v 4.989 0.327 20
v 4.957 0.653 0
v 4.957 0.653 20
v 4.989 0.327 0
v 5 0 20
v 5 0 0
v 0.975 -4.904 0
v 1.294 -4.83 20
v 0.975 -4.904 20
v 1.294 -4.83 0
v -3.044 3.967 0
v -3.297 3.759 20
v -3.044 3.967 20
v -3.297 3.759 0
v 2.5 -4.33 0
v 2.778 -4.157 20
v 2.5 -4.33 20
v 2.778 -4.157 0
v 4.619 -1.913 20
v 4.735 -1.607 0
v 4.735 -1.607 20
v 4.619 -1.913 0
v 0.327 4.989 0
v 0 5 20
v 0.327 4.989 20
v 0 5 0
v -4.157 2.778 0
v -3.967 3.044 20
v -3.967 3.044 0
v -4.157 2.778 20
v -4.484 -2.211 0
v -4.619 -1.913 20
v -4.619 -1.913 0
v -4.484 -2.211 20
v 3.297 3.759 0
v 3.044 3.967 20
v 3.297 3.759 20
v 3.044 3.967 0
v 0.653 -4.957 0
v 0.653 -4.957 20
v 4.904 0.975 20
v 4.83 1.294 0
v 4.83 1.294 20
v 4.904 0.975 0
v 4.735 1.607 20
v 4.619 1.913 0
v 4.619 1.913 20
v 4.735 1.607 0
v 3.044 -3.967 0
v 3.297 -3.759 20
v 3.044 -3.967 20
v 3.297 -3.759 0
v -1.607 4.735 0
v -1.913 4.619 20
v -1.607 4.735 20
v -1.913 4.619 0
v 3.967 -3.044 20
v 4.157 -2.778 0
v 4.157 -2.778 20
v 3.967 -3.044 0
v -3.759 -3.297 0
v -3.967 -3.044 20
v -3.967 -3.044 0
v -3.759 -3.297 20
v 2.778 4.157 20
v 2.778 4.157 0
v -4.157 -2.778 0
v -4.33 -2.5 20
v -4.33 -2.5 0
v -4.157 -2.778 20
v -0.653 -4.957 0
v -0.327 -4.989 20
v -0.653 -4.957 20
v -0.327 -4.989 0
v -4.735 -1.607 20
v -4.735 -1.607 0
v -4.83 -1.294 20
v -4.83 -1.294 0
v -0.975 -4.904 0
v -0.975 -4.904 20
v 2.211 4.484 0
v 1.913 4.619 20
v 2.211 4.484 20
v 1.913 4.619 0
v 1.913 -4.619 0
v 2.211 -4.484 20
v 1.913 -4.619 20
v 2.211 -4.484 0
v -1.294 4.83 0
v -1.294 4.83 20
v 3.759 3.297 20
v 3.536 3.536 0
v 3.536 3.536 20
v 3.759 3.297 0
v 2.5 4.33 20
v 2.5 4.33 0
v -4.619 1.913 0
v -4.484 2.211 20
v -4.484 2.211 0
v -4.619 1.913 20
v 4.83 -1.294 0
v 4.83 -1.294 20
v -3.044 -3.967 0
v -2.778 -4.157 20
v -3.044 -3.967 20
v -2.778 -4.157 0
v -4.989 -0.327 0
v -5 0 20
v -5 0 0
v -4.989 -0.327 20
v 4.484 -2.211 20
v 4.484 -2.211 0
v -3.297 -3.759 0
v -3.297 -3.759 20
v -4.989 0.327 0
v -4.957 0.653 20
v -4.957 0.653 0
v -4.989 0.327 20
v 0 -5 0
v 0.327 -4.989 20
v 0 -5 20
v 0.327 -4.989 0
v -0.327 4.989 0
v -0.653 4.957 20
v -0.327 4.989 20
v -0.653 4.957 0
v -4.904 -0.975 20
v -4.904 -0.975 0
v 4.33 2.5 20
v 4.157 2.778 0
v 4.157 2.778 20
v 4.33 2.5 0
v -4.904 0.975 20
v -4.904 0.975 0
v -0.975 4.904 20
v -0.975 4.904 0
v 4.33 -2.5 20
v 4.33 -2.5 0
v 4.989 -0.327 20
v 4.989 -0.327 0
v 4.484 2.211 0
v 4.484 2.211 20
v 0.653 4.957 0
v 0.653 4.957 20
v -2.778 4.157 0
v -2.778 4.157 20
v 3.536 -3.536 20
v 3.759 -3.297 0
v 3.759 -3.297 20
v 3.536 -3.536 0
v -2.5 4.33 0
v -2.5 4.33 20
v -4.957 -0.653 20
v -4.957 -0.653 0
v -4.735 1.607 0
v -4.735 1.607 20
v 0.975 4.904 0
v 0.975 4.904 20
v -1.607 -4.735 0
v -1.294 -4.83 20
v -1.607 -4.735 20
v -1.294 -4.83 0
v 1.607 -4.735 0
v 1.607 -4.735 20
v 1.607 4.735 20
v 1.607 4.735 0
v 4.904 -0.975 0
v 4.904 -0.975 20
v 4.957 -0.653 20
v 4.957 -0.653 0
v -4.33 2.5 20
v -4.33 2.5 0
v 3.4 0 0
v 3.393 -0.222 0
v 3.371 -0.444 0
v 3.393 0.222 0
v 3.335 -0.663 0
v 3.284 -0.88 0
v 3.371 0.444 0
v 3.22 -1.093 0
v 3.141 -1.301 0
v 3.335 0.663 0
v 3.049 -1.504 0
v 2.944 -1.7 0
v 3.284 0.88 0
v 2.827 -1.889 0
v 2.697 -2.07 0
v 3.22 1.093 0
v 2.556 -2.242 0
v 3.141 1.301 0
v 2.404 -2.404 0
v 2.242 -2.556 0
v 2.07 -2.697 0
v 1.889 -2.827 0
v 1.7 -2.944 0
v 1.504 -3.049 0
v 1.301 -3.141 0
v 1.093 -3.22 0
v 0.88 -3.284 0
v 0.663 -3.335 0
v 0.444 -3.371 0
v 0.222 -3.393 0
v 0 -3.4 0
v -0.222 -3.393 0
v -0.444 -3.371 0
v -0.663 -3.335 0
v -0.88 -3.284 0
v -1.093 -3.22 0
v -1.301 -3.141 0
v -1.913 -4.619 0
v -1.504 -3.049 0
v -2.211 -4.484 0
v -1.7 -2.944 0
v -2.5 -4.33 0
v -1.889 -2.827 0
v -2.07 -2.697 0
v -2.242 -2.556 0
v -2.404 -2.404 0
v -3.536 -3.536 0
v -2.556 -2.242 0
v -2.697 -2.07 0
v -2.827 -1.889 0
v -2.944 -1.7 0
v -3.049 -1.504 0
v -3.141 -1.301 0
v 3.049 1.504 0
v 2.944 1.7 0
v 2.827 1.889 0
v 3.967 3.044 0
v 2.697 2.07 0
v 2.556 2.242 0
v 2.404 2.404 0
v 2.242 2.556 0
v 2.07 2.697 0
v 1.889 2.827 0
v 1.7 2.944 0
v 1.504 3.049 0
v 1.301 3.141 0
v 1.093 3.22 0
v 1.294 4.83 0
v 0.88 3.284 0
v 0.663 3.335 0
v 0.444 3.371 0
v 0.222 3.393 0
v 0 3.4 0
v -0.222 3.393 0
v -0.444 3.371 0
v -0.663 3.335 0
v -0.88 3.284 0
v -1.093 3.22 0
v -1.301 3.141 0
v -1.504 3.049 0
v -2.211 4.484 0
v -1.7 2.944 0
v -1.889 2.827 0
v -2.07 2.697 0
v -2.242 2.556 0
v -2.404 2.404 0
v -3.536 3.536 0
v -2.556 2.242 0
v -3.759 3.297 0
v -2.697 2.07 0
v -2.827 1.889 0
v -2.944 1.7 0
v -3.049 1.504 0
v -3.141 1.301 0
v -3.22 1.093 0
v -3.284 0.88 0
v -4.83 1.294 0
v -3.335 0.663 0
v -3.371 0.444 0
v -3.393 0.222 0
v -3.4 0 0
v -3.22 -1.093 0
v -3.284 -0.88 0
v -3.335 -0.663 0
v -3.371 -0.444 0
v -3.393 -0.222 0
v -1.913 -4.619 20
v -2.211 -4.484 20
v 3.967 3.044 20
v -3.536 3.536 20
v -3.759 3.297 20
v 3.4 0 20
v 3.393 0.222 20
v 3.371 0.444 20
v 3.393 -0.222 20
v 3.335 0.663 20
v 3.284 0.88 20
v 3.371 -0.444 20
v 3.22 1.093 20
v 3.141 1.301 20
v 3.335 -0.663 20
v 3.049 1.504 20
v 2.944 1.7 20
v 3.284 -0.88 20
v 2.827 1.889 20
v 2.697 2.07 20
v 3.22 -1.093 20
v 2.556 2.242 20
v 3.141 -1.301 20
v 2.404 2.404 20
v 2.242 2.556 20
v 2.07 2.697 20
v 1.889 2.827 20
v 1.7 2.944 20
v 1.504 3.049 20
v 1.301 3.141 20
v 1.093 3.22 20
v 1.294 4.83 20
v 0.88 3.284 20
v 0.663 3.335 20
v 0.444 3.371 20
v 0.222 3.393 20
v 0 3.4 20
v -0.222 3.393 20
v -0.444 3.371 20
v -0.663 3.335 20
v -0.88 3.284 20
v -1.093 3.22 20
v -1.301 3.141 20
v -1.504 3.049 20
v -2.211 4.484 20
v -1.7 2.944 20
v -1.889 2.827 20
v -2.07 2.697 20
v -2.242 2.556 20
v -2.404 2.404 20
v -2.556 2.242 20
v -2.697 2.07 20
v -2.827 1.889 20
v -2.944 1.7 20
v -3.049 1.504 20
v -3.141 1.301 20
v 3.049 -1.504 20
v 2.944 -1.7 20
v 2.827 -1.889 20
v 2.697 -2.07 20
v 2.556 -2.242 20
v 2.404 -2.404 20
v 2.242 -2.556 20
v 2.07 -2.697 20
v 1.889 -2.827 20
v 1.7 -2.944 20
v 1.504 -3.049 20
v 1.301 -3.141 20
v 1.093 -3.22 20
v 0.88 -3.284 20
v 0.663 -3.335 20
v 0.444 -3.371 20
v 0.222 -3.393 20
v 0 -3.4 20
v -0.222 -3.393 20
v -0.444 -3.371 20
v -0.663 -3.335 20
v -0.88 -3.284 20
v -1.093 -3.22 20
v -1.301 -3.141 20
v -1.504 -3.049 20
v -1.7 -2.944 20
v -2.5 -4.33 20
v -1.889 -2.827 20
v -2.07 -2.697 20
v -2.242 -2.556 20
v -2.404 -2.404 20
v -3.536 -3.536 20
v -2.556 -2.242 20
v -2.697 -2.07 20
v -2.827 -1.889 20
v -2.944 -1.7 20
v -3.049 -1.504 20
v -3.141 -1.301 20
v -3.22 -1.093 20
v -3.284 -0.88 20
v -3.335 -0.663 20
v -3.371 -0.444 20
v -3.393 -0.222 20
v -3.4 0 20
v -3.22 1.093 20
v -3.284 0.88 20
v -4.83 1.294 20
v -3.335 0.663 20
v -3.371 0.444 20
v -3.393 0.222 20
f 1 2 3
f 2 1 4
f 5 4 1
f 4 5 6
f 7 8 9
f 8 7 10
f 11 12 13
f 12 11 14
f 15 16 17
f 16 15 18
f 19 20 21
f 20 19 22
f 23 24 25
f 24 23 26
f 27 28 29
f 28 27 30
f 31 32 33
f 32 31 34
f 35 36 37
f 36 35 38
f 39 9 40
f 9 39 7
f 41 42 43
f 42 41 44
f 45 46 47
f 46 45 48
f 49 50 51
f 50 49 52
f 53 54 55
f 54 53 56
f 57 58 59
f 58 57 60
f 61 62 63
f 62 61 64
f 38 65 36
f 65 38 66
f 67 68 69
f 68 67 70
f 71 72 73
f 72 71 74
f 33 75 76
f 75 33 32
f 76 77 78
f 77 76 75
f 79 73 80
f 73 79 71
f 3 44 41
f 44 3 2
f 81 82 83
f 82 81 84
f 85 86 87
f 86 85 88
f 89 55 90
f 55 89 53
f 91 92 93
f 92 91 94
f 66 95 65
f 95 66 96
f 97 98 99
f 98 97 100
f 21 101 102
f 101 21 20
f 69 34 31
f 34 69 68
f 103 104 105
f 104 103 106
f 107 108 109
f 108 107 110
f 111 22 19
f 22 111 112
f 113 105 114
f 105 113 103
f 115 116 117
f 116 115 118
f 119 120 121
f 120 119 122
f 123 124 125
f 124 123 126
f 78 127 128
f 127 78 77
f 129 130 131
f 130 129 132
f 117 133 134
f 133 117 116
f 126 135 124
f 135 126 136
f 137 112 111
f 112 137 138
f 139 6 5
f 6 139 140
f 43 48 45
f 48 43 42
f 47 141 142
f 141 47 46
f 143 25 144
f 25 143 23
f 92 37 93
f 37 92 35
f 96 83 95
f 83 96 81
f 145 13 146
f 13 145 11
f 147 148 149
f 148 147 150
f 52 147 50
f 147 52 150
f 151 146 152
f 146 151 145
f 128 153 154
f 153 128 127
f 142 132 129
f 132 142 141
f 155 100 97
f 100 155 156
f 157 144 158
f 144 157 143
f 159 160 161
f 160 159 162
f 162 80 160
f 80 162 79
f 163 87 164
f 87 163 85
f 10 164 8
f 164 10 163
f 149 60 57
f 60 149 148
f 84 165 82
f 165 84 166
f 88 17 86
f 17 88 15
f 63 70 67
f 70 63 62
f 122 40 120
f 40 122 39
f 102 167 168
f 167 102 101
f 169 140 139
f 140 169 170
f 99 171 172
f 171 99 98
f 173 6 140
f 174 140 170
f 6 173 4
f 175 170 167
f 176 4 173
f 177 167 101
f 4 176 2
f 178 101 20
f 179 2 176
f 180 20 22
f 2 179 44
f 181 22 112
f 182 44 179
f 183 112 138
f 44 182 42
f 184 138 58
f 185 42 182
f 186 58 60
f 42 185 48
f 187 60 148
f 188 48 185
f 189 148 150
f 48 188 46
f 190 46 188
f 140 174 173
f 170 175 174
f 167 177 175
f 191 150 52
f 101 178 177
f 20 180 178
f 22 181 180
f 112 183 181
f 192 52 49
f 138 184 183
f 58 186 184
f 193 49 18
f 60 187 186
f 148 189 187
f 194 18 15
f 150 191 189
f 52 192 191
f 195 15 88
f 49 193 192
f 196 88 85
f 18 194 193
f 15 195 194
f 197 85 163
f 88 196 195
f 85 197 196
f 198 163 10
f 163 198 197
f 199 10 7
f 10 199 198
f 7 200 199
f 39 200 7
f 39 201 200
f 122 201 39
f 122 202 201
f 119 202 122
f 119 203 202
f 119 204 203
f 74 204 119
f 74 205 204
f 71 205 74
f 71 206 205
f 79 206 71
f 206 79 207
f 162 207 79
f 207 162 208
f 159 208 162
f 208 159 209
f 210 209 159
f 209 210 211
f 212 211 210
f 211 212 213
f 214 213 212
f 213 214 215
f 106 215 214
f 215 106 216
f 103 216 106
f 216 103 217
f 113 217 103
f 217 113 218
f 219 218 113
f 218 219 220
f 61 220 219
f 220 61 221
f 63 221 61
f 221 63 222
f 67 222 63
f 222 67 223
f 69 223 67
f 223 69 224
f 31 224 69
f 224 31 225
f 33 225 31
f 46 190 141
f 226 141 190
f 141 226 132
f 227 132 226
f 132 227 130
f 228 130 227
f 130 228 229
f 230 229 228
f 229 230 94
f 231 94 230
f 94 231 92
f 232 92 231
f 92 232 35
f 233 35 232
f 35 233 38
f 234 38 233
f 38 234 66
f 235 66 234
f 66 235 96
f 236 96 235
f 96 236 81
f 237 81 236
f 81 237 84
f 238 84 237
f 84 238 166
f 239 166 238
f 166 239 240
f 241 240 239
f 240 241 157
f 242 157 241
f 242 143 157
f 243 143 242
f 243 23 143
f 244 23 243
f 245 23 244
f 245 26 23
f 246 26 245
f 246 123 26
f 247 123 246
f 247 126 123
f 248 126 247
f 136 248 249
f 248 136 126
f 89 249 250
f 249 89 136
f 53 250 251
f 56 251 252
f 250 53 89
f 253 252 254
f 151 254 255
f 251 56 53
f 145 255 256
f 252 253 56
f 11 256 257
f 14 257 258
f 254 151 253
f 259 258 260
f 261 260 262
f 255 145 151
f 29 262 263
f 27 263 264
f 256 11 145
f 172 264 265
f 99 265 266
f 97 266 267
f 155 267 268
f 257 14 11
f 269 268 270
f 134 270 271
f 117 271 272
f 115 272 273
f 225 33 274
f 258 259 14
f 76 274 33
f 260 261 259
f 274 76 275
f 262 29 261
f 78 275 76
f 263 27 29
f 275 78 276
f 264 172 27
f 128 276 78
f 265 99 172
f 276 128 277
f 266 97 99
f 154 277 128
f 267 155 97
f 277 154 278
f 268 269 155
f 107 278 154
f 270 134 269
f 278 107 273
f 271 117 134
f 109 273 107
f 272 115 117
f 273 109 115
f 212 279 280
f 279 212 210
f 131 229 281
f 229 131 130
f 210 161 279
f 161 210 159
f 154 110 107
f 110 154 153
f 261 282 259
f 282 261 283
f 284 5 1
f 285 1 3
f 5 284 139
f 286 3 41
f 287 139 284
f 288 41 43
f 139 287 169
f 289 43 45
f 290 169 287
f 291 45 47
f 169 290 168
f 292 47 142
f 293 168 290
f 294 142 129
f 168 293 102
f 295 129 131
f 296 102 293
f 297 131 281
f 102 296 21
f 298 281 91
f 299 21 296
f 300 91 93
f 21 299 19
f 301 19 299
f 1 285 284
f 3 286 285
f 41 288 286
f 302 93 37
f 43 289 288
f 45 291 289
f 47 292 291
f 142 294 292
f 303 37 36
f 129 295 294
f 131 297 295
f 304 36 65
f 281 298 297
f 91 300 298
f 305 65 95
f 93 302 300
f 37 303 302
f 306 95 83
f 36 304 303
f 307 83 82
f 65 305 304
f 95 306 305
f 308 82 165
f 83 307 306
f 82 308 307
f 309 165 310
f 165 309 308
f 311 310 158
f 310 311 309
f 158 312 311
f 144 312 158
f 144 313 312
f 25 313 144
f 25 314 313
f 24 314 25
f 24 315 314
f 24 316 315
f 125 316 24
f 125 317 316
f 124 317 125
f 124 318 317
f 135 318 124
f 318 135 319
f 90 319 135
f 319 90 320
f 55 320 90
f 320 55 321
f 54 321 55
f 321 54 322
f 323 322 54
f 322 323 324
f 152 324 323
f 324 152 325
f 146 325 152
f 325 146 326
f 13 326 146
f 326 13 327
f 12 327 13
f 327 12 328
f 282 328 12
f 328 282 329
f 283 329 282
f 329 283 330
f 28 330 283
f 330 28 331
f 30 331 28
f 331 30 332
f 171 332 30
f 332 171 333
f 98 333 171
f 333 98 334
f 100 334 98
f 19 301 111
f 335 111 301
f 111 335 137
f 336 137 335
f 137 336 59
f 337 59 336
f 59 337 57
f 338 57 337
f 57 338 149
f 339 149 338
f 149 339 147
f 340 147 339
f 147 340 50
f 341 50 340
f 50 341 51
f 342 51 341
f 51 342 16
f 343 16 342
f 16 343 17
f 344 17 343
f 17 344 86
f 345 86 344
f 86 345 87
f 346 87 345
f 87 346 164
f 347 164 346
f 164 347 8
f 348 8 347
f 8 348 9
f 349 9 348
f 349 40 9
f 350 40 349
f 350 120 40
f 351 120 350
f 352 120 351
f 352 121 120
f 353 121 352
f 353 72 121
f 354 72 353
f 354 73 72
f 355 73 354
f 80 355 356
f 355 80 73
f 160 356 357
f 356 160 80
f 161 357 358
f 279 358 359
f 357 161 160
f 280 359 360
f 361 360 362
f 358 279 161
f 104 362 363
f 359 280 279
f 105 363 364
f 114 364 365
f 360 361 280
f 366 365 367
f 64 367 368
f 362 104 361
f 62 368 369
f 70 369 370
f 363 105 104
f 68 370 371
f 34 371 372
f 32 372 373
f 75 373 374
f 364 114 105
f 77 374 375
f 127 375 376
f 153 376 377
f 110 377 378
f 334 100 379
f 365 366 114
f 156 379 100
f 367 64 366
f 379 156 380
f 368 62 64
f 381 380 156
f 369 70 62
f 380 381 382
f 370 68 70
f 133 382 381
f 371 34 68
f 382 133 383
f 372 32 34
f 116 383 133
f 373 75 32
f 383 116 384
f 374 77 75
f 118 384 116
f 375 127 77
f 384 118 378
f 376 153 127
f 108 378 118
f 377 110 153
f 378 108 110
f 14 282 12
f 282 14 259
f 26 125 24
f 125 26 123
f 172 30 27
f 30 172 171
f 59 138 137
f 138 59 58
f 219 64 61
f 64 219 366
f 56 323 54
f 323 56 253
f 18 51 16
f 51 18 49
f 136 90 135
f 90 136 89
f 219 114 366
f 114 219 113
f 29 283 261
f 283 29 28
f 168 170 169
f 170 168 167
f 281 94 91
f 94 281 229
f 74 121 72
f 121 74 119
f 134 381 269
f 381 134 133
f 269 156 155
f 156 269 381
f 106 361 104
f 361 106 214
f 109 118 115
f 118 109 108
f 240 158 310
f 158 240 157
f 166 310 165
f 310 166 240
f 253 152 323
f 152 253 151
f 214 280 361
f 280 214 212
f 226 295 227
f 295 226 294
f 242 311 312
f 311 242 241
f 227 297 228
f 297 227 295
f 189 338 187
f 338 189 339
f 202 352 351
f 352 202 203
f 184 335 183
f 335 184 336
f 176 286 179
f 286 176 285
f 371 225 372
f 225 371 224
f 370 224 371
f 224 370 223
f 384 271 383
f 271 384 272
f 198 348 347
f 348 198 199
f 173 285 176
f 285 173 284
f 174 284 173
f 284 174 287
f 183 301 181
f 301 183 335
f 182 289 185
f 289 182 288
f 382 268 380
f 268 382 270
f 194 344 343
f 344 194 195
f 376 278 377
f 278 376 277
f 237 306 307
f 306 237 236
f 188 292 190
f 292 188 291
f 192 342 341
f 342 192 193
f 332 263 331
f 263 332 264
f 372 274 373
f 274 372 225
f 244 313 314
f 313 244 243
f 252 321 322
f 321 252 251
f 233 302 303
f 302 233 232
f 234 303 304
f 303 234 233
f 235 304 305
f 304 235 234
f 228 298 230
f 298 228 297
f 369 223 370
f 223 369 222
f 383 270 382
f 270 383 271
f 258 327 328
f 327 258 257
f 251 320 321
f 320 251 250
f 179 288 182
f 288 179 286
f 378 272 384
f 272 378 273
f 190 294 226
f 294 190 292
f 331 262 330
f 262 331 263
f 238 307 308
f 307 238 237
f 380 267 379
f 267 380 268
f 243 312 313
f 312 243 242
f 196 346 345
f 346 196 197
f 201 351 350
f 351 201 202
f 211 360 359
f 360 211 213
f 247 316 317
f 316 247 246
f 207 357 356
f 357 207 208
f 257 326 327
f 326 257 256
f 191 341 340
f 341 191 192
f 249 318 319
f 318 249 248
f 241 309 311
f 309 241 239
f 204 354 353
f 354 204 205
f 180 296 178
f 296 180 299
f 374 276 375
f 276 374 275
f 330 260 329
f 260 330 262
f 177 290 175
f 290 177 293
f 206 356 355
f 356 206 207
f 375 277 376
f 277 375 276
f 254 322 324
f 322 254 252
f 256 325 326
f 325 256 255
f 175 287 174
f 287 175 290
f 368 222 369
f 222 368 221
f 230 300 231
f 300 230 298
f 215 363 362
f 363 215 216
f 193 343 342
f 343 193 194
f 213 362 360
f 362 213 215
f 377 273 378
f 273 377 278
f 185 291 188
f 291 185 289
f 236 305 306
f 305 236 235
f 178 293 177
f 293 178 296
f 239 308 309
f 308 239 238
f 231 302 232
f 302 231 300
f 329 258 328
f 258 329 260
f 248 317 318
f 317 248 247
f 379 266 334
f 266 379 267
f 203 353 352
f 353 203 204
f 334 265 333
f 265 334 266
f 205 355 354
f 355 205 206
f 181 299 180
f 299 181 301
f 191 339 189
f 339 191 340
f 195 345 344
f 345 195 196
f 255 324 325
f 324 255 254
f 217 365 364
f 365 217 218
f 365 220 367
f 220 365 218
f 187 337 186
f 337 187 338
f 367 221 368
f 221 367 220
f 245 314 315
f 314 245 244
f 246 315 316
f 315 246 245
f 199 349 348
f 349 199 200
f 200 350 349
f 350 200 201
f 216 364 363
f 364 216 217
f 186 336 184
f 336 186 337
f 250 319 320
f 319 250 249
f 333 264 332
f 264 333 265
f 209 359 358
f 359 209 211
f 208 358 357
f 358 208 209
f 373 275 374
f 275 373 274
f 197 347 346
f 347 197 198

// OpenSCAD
// Funnel with spout - printed upright, wide opening at the top
// Units: mm. Wall thickness: 1.6 mm throughout.

// ---- Parameters ----
spout_d        = 10;   // spout outer diameter
spout_bore     = 6.8;  // spout bore (10 - 2*1.6)
spout_h        = 20;   // spout height (z = 0 to 20)
cone_top_d     = 60;   // cone rim outer diameter at z = 50
cone_bottom_d  = 10;   // cone base outer diameter at z = 20 (matches spout)
cone_h         = 30;   // cone height (z = 20 to 50)
wall           = 1.6;  // wall thickness
eps            = 0.5;  // cutter overshoot past faces
$fn            = 96;   // curve resolution

// ---- Derived ----
cone_rim_r     = cone_top_d / 2;   // rim radius at z = 50
cone_base_r    = cone_bottom_d / 2; // base radius at z = 20
spout_r        = spout_d / 2;
spout_bore_r   = spout_bore / 2;

// ---- Model ----
union() {
    // Spout: tube from z = 0 to 20
    difference() {
        cylinder(d = spout_d, h = spout_h);
        translate([0, 0, -eps])
            cylinder(d = spout_bore, h = spout_h + 2 * eps);
    }

    // Cone: widens from 10 mm at z = 20 to 60 mm at z = 50
    difference() {
        // Cone shell: outer surface minus an inner cone, leaving a constant 1.6 mm wall
        linear_extrude(height = cone_h)
            cylinder(r1 = cone_base_r, r2 = cone_rim_r);
        translate([0, 0, spout_h - eps])
            linear_extrude(height = cone_h + 2 * eps)
                cylinder(r1 = cone_base_r - wall, r2 = cone_rim_r - wall);
    }
}
